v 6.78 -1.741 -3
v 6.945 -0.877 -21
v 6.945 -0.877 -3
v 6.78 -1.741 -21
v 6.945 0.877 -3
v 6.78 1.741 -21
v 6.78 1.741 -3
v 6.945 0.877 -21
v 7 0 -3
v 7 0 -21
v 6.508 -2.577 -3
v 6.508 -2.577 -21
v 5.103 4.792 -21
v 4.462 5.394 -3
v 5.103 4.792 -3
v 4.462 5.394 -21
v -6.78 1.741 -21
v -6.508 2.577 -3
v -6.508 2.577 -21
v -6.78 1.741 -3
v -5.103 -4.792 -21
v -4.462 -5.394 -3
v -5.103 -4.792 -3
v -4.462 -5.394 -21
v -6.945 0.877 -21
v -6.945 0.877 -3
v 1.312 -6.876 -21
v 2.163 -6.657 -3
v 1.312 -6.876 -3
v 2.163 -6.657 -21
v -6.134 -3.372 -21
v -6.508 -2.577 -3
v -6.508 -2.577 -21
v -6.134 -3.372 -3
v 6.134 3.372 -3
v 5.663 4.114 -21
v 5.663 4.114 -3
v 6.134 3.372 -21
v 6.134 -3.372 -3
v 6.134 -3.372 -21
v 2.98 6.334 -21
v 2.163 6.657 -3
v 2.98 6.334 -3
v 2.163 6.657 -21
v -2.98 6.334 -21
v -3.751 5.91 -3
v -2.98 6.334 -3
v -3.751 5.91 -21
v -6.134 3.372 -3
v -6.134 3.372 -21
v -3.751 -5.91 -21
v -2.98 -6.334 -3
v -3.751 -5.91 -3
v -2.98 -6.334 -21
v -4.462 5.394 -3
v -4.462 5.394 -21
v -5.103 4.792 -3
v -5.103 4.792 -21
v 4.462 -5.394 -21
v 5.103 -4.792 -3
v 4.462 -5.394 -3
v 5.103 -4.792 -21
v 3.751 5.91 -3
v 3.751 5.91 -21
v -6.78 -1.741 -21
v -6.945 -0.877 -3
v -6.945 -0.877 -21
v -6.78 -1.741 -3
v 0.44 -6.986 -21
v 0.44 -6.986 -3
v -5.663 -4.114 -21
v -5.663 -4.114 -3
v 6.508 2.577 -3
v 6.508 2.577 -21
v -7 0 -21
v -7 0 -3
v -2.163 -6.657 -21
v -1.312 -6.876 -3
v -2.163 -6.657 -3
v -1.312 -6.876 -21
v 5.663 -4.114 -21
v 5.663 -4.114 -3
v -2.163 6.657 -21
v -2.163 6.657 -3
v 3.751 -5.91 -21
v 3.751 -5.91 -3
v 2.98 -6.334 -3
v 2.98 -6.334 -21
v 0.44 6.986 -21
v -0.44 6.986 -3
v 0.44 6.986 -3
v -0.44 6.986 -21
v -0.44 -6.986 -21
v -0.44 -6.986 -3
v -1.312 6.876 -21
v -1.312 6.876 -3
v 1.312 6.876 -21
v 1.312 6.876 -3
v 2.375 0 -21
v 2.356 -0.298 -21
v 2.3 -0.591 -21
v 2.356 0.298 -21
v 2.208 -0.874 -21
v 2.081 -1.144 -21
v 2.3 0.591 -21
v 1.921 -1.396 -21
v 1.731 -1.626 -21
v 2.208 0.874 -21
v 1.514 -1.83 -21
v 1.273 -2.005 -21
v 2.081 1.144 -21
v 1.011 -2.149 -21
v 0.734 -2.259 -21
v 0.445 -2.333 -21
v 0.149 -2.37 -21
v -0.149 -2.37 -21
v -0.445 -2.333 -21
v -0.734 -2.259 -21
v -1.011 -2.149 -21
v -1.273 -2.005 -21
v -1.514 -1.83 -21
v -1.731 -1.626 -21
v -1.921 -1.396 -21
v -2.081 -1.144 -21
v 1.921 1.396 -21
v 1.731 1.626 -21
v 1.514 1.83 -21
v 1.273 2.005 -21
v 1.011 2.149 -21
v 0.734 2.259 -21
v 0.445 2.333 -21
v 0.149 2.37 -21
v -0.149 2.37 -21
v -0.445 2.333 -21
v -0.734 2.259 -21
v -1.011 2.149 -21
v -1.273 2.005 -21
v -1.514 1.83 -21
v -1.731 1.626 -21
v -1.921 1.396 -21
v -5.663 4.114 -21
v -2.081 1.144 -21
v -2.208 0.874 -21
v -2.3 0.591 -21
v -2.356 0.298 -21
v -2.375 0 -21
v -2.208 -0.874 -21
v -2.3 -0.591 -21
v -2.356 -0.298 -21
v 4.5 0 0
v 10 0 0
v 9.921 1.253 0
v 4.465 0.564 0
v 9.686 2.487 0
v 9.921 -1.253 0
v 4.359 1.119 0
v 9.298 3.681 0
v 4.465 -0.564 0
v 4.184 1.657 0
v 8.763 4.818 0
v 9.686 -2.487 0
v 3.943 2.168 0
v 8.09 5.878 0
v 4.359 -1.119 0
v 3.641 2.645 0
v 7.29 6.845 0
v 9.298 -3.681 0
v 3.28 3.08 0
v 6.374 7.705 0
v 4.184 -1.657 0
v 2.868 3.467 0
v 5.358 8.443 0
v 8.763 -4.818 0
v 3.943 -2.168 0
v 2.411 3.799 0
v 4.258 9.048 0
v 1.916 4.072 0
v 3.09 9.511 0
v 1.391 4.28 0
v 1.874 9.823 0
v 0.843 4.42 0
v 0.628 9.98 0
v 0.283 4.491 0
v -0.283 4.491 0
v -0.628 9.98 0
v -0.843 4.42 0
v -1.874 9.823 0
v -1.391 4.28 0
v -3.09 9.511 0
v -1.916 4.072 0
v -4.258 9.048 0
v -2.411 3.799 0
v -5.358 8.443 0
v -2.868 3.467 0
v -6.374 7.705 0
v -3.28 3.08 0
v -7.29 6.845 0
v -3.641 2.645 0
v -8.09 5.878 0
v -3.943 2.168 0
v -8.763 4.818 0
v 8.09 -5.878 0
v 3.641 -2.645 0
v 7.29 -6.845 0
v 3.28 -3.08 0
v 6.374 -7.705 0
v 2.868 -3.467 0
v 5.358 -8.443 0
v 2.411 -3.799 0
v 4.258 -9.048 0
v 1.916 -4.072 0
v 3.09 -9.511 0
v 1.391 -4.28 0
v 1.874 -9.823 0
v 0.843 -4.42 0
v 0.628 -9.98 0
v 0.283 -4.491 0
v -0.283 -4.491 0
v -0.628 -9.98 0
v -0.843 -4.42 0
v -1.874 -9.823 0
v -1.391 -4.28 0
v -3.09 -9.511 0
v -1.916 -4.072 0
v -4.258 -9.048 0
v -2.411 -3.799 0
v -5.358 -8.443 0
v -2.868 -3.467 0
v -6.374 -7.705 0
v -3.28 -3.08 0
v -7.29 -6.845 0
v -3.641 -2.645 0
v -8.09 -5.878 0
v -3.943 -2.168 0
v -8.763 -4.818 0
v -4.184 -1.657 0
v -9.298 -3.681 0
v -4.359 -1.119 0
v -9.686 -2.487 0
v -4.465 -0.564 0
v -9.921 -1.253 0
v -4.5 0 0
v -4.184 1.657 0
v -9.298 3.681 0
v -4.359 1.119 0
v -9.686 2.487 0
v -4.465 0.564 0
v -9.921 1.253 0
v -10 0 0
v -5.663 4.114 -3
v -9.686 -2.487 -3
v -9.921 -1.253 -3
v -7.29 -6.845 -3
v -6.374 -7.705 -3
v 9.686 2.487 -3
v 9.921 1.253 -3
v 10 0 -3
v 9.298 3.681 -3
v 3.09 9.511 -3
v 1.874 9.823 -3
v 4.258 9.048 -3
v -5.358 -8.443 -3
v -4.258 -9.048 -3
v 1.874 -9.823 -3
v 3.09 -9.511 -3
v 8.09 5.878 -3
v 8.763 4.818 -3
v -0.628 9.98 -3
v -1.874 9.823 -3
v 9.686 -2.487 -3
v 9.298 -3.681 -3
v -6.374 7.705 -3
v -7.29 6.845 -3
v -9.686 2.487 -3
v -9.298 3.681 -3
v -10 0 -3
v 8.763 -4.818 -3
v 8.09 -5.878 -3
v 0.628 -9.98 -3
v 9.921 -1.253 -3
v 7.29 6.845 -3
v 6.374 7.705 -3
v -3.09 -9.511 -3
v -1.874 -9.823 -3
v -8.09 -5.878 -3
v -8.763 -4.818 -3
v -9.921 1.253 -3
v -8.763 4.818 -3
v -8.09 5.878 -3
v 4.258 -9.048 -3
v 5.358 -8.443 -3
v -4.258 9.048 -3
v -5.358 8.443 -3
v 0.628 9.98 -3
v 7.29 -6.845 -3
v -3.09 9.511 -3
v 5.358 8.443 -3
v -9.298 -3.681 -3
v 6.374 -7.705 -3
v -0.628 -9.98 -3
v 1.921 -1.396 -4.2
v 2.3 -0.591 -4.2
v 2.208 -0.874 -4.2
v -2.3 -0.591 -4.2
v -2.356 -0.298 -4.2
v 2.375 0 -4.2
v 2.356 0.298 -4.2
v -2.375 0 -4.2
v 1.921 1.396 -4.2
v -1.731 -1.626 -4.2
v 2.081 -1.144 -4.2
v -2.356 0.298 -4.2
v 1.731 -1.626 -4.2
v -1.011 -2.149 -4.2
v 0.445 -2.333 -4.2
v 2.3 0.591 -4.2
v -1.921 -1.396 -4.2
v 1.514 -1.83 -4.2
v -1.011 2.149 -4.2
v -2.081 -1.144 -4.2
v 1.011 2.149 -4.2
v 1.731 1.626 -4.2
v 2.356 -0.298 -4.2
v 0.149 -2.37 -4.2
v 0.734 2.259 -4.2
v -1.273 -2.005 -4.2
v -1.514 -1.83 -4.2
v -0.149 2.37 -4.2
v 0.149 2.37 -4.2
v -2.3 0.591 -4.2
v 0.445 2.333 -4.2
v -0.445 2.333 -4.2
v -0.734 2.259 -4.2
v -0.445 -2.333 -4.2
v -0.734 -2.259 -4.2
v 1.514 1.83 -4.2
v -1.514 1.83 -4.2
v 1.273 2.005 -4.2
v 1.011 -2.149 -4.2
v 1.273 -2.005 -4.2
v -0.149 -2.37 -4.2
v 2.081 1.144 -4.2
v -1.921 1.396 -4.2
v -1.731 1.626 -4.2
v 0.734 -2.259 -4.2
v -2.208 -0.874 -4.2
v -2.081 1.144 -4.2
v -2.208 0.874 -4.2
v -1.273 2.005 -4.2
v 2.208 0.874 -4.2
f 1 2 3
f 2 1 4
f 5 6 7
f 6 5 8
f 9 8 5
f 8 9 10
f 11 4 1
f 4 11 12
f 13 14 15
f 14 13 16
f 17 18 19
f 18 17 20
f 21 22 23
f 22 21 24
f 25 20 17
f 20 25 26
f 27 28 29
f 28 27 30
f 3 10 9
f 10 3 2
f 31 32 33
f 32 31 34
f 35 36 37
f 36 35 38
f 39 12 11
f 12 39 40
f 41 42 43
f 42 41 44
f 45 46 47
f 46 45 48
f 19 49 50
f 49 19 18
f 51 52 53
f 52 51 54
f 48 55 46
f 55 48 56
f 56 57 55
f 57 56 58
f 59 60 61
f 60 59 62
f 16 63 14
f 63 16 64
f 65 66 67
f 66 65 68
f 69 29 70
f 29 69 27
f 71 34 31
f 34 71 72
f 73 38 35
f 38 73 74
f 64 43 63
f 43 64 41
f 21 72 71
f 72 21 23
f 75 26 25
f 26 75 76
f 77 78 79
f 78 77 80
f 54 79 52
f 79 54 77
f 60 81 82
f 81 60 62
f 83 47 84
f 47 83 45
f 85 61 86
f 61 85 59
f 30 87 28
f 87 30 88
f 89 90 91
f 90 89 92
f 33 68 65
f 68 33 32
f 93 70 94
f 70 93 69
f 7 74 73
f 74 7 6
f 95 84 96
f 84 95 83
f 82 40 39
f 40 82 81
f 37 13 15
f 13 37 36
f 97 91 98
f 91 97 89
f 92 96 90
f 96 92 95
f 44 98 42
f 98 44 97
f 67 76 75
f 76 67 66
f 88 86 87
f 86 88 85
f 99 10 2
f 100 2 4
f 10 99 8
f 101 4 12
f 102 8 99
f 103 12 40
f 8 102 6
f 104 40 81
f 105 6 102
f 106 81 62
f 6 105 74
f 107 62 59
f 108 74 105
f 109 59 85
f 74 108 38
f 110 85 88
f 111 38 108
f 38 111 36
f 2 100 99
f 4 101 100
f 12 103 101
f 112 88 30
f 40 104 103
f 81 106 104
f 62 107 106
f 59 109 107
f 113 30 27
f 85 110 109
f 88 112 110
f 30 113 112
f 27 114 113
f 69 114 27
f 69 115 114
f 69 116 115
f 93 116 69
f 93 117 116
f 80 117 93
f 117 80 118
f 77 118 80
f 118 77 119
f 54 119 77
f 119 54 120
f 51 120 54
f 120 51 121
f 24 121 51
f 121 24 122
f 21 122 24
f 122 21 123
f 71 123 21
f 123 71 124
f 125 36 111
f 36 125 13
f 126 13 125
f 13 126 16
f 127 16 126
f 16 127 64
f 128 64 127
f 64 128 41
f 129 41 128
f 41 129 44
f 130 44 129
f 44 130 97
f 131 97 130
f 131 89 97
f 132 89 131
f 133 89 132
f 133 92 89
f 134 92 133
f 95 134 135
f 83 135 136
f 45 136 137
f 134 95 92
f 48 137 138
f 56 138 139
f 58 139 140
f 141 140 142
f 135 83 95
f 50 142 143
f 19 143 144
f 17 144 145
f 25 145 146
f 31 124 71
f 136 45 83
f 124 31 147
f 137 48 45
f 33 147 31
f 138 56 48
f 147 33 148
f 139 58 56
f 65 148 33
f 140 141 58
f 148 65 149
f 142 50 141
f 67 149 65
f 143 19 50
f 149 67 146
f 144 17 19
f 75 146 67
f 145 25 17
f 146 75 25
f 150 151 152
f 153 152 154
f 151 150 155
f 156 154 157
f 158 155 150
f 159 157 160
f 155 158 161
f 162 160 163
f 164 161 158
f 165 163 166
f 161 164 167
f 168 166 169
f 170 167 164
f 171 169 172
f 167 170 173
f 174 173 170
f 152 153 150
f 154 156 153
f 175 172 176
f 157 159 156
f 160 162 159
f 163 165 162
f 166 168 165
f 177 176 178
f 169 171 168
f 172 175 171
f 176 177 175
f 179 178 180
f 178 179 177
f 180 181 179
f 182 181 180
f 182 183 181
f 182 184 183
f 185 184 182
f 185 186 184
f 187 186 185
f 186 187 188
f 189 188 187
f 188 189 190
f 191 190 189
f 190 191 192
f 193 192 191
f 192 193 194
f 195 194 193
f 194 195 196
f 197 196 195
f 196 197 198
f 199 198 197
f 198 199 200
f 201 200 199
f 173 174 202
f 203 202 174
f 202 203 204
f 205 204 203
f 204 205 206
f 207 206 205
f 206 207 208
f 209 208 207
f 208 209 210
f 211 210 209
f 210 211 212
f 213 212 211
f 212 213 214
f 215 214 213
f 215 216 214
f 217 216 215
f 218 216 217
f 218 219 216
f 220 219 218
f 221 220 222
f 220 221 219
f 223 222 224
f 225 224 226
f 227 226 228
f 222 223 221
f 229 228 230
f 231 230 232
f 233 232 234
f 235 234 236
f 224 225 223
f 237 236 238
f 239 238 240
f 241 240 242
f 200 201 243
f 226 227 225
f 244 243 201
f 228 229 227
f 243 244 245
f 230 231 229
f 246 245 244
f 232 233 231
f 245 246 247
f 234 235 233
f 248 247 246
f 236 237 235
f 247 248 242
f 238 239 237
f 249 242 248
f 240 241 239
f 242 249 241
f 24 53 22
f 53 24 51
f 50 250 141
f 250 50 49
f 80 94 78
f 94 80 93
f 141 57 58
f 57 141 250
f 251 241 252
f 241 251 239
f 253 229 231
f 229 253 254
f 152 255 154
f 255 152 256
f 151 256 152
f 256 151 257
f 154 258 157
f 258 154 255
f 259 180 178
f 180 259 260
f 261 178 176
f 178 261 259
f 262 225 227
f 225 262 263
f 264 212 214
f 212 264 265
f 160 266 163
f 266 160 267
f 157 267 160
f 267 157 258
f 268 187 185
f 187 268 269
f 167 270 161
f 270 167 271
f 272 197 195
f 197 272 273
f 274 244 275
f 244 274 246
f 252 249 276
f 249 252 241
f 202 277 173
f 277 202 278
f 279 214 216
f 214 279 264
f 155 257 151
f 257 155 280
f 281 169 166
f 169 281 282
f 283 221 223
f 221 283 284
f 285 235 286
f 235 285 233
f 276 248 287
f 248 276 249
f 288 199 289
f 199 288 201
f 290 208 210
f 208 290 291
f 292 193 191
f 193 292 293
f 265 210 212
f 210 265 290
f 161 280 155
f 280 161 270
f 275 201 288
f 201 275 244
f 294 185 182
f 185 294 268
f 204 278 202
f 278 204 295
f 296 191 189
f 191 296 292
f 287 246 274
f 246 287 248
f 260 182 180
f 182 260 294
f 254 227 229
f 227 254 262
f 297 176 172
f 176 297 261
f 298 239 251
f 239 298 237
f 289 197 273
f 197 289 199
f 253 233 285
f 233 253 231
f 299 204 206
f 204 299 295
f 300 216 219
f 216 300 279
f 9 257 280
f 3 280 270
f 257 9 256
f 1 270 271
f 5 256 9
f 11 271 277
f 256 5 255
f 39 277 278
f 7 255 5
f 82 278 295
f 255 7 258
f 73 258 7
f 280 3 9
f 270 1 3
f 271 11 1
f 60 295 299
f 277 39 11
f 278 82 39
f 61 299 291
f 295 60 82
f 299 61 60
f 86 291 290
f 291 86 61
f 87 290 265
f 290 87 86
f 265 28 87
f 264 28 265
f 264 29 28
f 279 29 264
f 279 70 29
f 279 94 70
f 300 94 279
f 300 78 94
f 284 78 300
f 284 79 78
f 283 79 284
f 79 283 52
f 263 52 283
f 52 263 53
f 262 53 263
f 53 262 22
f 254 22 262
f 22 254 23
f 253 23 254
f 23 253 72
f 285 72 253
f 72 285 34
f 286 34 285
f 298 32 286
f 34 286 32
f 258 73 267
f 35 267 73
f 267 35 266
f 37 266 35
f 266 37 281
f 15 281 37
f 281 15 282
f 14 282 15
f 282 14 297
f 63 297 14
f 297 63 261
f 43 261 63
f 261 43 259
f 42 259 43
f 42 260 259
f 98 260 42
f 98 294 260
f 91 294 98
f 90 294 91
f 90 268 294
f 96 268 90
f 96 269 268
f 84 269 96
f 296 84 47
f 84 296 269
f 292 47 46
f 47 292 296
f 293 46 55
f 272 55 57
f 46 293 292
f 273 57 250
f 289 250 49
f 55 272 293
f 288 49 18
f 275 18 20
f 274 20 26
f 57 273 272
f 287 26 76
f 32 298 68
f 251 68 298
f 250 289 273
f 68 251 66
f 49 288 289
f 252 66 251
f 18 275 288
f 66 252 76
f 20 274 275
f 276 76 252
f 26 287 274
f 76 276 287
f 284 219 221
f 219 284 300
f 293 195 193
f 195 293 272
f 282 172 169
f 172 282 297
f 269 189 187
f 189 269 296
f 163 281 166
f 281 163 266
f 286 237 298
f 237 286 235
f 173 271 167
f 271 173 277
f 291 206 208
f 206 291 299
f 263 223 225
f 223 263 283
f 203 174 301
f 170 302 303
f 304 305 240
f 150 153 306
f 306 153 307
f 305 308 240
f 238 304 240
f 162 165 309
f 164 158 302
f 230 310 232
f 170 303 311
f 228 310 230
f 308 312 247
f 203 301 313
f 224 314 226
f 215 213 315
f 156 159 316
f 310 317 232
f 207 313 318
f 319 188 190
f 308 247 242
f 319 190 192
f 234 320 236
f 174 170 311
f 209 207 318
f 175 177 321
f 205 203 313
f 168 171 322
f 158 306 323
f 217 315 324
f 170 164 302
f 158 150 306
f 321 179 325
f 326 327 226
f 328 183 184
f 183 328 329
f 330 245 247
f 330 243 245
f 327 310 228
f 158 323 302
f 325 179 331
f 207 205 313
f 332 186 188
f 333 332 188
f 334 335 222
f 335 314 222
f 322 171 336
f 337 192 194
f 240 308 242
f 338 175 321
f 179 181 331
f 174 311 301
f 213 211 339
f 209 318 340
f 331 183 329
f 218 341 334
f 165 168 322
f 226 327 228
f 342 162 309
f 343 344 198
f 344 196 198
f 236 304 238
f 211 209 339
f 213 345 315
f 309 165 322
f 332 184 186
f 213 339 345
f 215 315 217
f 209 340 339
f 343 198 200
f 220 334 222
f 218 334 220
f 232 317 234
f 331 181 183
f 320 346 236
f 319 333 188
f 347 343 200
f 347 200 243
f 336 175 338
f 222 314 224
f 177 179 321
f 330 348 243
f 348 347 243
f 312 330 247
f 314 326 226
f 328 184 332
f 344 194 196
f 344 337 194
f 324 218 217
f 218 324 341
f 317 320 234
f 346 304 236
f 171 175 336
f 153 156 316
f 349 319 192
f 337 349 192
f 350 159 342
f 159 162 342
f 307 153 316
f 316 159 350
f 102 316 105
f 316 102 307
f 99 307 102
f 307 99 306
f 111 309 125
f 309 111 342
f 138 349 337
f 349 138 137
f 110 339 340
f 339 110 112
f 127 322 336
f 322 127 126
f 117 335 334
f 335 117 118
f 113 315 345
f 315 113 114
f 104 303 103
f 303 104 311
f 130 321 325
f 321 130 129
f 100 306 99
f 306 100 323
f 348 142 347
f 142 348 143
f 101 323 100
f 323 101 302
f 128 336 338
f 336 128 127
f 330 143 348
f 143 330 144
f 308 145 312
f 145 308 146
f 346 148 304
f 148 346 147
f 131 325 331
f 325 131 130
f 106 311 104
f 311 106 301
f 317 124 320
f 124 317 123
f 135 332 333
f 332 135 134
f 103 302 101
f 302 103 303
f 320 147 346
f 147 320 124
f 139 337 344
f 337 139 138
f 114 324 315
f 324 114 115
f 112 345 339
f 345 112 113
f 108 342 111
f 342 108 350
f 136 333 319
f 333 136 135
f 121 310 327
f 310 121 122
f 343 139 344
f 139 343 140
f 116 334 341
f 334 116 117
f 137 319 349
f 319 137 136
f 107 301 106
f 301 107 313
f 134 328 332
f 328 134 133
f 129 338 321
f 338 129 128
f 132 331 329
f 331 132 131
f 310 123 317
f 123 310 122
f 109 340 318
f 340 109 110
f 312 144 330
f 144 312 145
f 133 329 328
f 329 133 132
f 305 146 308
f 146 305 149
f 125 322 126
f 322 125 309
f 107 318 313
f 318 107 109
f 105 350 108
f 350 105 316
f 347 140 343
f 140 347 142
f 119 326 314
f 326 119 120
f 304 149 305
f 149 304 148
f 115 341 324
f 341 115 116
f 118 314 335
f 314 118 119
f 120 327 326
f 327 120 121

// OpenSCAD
$fn = 50;


difference() {
	union() {
		translate(v = [0, 0, -21.0000000000]) {
			cylinder(h = 21, r = 7.0000000000);
		}
		translate(v = [0, 0, -3.0000000000]) {
			cylinder(h = 3, r = 10.0000000000);
		}
	}
	union() {
		translate(v = [0, 0, 0]) {
			rotate(a = [0, 0, 0]) {
				difference() {
					union() {
						#translate(v = [0, 0, -21.0000000000]) {
							cylinder(h = 21, r = 2.2500000000);
						}
						#translate(v = [0, 0, -4.2000000000]) {
							cylinder(h = 4.2000000000, r1 = 2.3750000000, r2 = 4.5000000000);
						}
						#translate(v = [0, 0, -21.0000000000]) {
							cylinder(h = 21, r = 2.3750000000);
						}
						#translate(v = [0, 0, -21.0000000000]) {
							cylinder(h = 21, r = 2.2500000000);
						}
					}
					union();
				}
			}
		}
	}
}
